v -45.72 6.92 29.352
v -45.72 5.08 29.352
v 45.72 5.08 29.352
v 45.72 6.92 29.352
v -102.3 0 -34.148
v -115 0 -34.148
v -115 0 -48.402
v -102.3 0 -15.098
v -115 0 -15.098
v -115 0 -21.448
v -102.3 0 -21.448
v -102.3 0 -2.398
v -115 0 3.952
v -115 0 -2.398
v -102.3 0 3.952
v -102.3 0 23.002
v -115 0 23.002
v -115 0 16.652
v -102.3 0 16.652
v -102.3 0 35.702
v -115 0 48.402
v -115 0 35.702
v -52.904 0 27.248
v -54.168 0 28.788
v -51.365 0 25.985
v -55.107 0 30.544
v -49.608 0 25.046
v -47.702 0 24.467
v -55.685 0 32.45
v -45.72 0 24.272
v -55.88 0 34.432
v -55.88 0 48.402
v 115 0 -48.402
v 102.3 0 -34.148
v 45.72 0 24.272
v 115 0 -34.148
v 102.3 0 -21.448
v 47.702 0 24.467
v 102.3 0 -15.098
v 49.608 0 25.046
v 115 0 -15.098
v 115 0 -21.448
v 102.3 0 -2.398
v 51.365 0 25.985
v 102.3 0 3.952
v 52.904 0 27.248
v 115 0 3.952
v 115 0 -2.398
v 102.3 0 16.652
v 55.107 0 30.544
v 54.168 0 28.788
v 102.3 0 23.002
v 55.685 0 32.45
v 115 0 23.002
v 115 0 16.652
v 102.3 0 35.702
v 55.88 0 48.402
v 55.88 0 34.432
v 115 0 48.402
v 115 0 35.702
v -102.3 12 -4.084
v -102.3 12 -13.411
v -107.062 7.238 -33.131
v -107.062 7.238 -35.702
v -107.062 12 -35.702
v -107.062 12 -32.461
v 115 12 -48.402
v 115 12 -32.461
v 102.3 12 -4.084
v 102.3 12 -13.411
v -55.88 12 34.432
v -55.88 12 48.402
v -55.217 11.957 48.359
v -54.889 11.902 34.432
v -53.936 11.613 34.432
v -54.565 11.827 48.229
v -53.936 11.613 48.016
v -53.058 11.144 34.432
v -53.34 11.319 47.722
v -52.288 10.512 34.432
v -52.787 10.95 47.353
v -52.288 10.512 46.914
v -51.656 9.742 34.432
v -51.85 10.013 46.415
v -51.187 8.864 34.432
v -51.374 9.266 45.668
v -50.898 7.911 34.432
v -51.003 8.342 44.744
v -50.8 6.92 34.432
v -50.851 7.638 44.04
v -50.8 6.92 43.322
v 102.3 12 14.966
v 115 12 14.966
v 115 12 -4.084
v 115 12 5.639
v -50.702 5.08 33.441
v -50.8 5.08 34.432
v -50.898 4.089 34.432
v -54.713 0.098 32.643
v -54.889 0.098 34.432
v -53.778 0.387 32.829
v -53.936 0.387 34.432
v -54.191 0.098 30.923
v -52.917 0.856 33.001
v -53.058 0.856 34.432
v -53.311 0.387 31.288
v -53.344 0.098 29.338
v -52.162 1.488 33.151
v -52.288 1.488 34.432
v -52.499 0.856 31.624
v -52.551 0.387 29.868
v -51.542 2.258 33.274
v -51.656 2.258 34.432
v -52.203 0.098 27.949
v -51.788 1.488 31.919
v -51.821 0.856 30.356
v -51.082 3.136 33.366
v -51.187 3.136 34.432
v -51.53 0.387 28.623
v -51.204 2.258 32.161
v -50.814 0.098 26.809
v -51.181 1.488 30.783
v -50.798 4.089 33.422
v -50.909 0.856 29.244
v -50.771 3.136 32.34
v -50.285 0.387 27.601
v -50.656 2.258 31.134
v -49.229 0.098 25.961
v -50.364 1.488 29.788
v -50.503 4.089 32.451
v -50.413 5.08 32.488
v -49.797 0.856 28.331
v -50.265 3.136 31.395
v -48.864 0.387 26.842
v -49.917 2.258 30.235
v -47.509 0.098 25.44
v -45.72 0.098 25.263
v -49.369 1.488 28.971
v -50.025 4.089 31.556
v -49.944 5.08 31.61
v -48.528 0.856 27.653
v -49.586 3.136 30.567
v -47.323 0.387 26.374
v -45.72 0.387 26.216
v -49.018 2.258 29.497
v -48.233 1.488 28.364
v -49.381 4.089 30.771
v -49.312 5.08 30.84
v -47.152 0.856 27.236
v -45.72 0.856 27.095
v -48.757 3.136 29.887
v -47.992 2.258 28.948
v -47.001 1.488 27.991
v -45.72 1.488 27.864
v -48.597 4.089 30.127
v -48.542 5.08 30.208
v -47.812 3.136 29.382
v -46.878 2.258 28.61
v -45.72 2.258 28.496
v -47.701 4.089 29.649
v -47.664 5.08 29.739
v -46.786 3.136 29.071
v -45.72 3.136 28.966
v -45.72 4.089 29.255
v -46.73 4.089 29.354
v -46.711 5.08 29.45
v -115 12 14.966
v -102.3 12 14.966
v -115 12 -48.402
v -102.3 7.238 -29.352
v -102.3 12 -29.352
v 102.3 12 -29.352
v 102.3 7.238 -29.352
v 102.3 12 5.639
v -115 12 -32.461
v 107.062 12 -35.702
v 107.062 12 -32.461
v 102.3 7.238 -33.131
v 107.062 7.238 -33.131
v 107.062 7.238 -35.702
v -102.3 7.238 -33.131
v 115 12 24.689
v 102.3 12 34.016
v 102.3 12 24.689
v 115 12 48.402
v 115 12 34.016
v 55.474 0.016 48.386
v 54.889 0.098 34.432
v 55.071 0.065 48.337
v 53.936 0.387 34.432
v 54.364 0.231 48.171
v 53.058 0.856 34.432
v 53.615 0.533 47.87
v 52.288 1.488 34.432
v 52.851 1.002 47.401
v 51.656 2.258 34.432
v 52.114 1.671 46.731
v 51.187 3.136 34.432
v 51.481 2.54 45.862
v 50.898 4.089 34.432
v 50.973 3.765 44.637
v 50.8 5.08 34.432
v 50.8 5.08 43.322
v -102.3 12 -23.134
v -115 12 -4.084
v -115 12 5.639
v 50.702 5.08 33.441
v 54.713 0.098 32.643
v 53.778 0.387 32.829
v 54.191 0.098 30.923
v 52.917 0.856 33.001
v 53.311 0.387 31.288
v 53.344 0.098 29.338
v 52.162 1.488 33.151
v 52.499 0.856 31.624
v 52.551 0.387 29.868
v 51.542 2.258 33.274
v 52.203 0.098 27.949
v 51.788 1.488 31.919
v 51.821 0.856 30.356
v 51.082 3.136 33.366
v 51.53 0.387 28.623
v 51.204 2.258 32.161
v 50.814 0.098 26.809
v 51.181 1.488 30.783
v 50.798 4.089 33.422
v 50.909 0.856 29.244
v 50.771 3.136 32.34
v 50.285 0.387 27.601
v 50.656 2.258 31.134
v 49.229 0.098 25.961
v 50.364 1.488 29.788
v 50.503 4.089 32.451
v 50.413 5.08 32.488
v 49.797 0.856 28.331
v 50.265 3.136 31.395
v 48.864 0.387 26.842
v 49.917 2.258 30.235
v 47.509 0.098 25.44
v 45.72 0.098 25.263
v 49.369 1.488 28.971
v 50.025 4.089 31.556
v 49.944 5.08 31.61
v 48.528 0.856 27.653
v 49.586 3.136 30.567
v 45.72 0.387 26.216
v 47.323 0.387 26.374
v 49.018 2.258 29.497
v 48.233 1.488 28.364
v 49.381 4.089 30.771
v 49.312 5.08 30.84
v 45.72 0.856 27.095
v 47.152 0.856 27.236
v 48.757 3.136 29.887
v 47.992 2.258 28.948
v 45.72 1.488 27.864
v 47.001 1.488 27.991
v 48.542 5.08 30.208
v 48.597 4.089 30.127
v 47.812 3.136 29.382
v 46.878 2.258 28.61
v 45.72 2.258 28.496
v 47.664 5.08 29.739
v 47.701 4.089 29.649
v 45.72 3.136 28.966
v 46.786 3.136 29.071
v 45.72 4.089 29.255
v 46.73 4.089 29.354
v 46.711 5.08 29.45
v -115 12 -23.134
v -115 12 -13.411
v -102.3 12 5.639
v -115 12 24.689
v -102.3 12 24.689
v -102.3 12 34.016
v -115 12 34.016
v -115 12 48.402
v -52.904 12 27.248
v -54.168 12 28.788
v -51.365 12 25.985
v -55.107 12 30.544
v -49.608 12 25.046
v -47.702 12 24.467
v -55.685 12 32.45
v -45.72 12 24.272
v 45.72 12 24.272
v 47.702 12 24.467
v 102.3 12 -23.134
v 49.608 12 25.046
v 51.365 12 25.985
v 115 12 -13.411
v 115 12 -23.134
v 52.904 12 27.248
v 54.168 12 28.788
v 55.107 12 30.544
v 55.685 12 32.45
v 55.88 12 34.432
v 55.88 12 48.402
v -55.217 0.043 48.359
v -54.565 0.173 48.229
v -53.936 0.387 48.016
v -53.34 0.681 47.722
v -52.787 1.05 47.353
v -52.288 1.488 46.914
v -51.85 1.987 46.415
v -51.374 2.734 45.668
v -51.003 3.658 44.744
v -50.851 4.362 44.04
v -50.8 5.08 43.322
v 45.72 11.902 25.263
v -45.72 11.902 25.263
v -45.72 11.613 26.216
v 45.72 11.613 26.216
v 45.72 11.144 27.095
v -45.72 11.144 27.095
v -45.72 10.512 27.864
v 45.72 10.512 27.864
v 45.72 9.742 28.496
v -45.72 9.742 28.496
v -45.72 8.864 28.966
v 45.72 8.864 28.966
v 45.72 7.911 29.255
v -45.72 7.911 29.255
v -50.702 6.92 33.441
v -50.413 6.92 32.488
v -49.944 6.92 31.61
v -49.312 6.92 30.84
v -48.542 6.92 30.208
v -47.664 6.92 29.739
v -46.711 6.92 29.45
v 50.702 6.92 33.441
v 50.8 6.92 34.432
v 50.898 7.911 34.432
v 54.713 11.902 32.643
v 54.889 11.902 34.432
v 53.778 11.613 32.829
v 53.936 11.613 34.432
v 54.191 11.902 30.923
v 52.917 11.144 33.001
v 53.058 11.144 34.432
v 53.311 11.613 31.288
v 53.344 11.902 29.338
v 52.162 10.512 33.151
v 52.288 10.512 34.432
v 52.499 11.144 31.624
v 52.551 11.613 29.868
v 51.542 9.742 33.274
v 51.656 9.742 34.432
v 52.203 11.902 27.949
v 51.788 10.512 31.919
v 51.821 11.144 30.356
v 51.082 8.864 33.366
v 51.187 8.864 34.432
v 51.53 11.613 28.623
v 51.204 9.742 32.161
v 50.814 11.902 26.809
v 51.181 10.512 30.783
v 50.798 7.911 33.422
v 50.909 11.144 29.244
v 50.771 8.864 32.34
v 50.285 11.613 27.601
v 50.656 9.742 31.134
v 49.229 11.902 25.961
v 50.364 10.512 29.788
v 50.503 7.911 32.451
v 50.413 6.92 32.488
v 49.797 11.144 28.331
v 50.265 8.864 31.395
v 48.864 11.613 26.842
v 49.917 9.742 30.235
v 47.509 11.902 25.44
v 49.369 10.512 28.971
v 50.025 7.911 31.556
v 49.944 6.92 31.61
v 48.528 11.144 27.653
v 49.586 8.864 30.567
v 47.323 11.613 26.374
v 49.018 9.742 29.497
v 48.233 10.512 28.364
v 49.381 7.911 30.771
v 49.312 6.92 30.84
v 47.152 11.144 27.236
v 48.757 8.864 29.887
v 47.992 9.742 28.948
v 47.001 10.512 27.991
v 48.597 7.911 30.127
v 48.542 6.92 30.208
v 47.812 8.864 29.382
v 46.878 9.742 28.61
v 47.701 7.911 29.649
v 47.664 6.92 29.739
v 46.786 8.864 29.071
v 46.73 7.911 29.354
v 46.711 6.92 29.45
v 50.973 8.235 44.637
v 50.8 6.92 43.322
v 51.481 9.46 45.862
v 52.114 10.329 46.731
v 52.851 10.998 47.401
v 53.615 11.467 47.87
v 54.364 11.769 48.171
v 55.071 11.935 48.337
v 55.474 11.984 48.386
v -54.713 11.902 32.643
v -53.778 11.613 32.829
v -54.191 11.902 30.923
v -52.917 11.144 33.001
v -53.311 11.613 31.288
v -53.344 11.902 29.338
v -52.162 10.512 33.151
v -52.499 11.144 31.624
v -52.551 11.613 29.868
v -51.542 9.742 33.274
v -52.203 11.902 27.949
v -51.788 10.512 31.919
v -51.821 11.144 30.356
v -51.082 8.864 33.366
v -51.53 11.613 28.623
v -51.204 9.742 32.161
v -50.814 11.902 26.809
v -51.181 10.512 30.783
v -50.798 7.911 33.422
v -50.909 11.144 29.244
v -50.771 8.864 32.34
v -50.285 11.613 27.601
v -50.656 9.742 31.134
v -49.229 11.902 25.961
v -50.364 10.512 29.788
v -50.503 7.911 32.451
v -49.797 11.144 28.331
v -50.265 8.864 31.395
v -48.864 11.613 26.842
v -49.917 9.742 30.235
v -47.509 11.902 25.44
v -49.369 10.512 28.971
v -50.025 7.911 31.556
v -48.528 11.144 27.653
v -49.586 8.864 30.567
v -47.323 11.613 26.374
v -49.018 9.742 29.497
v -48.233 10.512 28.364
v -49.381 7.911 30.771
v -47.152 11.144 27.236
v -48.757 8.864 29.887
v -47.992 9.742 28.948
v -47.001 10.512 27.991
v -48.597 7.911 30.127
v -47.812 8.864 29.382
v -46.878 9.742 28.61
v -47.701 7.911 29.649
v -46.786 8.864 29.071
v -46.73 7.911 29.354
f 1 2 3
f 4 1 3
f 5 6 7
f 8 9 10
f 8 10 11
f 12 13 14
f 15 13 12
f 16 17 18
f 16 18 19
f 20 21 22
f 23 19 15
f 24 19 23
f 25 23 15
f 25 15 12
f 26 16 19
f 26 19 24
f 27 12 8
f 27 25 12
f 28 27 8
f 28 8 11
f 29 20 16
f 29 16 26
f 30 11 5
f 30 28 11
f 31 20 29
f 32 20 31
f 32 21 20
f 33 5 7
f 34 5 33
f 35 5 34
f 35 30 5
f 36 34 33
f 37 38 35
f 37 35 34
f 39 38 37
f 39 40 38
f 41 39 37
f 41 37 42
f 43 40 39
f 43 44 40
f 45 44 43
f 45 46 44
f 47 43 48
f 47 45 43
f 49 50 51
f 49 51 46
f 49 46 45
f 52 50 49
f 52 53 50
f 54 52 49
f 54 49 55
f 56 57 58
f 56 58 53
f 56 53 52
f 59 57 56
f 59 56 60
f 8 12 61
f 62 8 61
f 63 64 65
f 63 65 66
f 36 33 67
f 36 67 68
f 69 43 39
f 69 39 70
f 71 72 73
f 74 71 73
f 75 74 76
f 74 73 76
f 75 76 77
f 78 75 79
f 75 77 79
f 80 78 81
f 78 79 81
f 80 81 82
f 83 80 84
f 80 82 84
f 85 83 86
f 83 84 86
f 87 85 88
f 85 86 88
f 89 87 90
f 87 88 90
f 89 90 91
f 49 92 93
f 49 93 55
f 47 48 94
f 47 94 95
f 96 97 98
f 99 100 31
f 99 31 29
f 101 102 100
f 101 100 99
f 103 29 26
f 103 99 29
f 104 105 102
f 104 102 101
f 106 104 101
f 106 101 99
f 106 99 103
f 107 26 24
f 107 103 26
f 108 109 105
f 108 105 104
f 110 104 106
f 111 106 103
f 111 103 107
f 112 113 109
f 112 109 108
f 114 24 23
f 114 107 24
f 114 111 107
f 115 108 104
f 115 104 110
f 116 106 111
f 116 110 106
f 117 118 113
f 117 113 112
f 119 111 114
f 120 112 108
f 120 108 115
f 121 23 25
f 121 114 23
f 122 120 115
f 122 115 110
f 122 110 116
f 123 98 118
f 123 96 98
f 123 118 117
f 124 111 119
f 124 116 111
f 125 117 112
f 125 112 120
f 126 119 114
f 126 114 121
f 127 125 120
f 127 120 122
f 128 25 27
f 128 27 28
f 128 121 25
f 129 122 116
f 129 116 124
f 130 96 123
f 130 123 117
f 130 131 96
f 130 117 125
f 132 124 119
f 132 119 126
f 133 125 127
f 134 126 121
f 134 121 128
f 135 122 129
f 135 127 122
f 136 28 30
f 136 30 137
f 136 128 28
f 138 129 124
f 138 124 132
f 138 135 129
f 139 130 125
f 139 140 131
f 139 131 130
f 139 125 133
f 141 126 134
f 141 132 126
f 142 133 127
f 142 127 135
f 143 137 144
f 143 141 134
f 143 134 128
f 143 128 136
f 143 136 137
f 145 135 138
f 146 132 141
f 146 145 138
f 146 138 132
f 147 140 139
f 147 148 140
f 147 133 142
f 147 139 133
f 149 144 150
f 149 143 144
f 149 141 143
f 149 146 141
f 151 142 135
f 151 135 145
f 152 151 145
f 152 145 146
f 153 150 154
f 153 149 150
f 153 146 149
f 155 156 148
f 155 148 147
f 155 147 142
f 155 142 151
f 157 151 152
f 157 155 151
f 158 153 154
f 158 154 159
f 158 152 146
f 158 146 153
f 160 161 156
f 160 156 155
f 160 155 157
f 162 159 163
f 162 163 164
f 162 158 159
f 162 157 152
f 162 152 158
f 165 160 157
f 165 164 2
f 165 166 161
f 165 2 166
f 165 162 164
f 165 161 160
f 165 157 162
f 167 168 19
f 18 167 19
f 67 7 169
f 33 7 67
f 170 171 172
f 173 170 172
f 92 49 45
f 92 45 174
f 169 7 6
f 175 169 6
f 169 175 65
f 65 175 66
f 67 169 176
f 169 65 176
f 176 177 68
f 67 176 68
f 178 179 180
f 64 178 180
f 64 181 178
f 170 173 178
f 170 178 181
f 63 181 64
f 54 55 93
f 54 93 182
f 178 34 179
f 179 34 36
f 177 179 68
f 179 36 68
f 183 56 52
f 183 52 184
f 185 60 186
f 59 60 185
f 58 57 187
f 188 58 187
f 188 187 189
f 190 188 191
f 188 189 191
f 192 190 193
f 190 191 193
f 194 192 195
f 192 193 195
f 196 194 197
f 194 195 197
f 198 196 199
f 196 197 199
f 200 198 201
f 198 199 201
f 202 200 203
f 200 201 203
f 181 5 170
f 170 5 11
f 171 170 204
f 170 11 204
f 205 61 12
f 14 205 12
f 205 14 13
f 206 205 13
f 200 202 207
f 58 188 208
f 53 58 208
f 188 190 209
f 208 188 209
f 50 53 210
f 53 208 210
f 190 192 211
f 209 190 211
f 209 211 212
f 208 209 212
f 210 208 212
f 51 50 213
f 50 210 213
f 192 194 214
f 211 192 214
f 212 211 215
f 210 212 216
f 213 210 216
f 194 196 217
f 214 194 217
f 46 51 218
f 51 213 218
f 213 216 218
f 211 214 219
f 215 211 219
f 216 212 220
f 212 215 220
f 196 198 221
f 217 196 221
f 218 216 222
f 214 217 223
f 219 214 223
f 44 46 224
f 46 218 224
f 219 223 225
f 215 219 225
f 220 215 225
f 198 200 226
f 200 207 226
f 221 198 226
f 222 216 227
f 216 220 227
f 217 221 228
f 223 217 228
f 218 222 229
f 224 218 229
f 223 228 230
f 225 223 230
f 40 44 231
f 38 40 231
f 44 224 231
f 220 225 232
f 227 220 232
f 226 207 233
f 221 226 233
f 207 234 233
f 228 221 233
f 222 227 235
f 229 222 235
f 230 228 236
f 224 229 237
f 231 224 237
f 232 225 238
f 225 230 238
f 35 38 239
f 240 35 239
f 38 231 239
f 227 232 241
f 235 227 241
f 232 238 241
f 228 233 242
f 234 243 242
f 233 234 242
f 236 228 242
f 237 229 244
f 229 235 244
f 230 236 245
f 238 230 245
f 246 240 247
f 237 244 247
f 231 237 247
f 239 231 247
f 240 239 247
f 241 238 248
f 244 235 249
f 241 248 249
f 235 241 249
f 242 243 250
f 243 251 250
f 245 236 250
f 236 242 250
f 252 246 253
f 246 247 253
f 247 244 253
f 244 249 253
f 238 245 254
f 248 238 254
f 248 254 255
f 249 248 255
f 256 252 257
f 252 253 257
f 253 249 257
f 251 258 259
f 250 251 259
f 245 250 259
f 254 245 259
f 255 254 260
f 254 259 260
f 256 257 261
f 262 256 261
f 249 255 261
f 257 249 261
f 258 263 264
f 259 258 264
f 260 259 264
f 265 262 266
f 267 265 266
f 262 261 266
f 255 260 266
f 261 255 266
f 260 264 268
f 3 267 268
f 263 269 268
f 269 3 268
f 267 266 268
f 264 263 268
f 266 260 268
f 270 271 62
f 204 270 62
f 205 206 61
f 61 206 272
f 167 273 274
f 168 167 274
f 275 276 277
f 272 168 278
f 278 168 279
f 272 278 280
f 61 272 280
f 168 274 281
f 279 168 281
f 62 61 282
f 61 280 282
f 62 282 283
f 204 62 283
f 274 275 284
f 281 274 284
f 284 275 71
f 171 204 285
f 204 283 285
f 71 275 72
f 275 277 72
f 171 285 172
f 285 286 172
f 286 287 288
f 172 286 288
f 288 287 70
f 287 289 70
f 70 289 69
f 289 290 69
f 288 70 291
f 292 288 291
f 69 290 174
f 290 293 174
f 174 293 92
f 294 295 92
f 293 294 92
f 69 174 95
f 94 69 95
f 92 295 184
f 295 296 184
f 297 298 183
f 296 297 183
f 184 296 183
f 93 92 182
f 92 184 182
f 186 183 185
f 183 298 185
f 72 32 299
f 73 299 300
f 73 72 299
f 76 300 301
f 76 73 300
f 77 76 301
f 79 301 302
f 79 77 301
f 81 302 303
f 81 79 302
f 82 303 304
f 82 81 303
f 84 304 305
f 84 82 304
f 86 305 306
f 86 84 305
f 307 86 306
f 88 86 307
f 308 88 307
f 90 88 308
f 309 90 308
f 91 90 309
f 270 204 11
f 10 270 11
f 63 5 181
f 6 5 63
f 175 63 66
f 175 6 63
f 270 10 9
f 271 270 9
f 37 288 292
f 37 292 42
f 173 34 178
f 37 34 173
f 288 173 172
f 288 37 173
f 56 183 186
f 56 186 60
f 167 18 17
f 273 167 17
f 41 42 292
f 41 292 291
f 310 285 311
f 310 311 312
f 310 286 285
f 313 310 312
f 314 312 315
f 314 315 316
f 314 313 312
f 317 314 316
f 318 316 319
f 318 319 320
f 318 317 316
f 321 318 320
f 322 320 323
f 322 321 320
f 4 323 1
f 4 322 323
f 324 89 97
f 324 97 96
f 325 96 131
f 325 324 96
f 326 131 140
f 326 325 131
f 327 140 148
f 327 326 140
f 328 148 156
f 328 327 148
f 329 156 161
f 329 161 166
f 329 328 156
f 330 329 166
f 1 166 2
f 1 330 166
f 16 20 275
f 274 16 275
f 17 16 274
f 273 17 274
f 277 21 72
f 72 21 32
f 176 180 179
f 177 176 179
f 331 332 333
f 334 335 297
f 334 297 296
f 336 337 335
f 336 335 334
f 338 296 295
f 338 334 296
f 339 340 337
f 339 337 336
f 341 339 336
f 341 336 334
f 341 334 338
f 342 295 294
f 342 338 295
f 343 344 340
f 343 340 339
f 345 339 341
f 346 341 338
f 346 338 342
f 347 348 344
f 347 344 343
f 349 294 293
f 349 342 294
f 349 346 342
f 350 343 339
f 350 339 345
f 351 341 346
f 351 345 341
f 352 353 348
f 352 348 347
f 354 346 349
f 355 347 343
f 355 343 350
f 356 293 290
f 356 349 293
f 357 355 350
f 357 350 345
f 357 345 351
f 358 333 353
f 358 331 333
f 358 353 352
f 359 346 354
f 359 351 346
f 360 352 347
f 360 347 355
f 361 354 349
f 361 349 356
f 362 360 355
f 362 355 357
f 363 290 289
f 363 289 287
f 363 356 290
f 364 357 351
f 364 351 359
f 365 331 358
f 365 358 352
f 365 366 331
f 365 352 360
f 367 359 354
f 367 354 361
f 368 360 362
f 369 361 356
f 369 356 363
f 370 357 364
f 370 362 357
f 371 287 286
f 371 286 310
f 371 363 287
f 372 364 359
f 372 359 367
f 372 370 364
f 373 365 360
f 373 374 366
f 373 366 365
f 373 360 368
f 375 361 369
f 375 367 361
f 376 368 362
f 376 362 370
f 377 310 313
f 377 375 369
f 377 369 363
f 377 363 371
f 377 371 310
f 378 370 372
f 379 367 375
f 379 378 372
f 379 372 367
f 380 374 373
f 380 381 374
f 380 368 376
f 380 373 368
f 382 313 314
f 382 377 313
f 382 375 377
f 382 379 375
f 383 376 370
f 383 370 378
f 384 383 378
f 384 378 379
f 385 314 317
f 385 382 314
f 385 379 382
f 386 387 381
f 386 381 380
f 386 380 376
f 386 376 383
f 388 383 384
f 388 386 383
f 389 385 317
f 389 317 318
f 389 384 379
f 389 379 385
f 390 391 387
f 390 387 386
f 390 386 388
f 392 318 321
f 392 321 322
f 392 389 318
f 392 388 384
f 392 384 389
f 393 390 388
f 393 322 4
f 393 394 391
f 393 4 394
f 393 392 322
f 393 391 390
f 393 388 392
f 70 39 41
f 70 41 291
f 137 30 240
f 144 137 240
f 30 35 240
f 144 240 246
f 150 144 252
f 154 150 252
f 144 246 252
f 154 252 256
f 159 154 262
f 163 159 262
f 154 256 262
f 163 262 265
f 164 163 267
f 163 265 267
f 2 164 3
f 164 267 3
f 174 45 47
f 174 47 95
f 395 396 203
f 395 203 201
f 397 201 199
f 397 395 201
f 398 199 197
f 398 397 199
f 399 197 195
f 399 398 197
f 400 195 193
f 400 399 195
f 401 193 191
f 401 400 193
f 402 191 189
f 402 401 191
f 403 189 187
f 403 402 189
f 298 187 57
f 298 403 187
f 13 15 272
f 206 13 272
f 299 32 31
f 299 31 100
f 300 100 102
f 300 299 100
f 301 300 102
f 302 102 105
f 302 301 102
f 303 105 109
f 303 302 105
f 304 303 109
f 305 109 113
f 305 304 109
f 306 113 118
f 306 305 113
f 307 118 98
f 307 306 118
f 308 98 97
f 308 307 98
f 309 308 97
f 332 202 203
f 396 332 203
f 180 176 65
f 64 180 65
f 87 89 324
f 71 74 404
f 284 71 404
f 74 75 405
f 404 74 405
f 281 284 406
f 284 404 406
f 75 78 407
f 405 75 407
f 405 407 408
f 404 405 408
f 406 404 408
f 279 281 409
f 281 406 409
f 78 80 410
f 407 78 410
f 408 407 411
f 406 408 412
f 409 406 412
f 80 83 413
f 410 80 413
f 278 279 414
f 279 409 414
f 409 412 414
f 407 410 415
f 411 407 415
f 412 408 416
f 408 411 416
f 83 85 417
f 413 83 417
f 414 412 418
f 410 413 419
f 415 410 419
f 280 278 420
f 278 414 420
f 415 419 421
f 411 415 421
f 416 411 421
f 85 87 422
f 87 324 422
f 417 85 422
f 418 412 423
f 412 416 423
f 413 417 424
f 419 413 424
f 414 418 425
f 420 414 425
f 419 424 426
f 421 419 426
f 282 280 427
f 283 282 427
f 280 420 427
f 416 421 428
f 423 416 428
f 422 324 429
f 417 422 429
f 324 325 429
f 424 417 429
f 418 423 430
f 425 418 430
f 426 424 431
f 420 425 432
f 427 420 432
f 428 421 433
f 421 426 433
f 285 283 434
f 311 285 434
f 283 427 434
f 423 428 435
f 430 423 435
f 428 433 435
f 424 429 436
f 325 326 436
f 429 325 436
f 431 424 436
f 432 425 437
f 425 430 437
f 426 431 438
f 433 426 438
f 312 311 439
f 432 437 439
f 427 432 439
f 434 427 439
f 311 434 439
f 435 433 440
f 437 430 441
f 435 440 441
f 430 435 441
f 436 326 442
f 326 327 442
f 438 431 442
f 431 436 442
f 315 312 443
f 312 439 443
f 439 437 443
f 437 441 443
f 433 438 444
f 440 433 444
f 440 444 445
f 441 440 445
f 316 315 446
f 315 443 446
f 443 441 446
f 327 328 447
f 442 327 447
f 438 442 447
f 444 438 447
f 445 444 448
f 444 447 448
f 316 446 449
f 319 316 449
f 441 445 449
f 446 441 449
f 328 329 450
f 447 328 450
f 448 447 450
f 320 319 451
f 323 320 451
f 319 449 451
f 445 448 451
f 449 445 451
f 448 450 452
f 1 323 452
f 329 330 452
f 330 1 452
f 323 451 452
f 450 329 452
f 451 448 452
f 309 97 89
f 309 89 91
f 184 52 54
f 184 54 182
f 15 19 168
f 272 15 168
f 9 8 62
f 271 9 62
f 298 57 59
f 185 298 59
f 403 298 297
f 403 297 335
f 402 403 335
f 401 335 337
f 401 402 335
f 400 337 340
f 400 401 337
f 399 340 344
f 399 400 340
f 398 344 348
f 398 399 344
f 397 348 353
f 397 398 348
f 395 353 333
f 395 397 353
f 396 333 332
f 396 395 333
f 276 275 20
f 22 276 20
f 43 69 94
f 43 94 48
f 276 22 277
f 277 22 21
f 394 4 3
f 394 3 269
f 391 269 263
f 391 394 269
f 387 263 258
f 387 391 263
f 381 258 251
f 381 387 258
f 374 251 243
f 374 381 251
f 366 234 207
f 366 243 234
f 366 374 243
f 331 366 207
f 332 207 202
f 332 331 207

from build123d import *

# Parameters (mm, degrees)
F0_W     = 230
F0_H     = 96.8045385678
F1_DEPTH = 12
F2_W     = 101.6
F2_H     = 19.05
F3_DEPTH = 12
F4_R     = 5.08
F6_DEPTH = 12.7
F7_W     = 204.6
F7_H     = 6.35
F7_W_2   = 4.7625
F8_DEPTH = 4.7625


# Not quite as in the source:
# - a pattern or mirror of a feature is missing from the dataset's text; its kind, count and spacing are read off the source's solid


with BuildPart() as f1:
    # F0 (on Front) → F1 (new body)
    with BuildSketch(Plane.XZ):
        Rectangle(F0_W, F0_H)
    extrude(amount=-F1_DEPTH)

    # F2 (on face) → F3 (cut, through all)
    with BuildSketch(Plane.XZ):
        with Locations((0, 38.8772692839)):
            Rectangle(F2_W, F2_H)
    extrude(amount=-F3_DEPTH, mode=Mode.SUBTRACT)

    # F4
    f4_edges = [f1.edges().sort_by_distance(p)[0] for p in [
        (-50.8, 6, 48.402269),
        (-50.8, 6, 29.352269),
        (-50.8, 0, 38.877269),
        (-50.8, 12, 38.877269),
        (50.8, 6, 29.352269),
        (50.8, 6, 48.402269),
        (50.8, 0, 38.877269),
        (50.8, 12, 38.877269),
        (0, 0, 29.352269),
        (0, 12, 29.352269),
    ]]
    fillet(f4_edges, radius=F4_R)

    # F5 (on face) → F6 (cut)
    with BuildSketch(Plane.YZ.offset(115)):
        Polygon((12, 34.0157792675), (0, 35.7022692839), (0, 23.0022692839), (12, 24.6887593003), align=None)
        Polygon((12, 14.9657792675), (0, 16.6522692839), (0, 3.9522692839), (12, 5.6387593003), align=None)
        Polygon((12, -4.0842207325), (0, -2.3977307161), (0, -15.0977307161), (12, -13.4112406997), align=None)
        Polygon((12, -23.1342207325), (0, -21.4477307161), (0, -34.1477307161), (12, -32.4612406997), align=None)
    f6 = extrude(amount=-F6_DEPTH, mode=Mode.SUBTRACT)

    # F6_copies: F6 across plane
    add(f6.mirror(Plane(origin=(0, 0, 0), x_dir=(0, 0, -1), z_dir=(-1, 0, 0))), mode=Mode.SUBTRACT)

    # F7 (on face) → F8 (cut)
    with BuildSketch(Plane(origin=(0, 12, 0), x_dir=(-1, 0, 0), z_dir=(0, 1, 0))):
        with Locations((0, -32.5272692839)):
            Rectangle(F7_W, F7_H)
        with Locations((-104.68125, -32.5272692839)):
            Rectangle(F7_W_2, F7_H)
        with Locations((104.68125, -32.5272692839)):
            Rectangle(F7_W_2, F7_H)
    extrude(amount=-F8_DEPTH, mode=Mode.SUBTRACT)


solid = f1.part
